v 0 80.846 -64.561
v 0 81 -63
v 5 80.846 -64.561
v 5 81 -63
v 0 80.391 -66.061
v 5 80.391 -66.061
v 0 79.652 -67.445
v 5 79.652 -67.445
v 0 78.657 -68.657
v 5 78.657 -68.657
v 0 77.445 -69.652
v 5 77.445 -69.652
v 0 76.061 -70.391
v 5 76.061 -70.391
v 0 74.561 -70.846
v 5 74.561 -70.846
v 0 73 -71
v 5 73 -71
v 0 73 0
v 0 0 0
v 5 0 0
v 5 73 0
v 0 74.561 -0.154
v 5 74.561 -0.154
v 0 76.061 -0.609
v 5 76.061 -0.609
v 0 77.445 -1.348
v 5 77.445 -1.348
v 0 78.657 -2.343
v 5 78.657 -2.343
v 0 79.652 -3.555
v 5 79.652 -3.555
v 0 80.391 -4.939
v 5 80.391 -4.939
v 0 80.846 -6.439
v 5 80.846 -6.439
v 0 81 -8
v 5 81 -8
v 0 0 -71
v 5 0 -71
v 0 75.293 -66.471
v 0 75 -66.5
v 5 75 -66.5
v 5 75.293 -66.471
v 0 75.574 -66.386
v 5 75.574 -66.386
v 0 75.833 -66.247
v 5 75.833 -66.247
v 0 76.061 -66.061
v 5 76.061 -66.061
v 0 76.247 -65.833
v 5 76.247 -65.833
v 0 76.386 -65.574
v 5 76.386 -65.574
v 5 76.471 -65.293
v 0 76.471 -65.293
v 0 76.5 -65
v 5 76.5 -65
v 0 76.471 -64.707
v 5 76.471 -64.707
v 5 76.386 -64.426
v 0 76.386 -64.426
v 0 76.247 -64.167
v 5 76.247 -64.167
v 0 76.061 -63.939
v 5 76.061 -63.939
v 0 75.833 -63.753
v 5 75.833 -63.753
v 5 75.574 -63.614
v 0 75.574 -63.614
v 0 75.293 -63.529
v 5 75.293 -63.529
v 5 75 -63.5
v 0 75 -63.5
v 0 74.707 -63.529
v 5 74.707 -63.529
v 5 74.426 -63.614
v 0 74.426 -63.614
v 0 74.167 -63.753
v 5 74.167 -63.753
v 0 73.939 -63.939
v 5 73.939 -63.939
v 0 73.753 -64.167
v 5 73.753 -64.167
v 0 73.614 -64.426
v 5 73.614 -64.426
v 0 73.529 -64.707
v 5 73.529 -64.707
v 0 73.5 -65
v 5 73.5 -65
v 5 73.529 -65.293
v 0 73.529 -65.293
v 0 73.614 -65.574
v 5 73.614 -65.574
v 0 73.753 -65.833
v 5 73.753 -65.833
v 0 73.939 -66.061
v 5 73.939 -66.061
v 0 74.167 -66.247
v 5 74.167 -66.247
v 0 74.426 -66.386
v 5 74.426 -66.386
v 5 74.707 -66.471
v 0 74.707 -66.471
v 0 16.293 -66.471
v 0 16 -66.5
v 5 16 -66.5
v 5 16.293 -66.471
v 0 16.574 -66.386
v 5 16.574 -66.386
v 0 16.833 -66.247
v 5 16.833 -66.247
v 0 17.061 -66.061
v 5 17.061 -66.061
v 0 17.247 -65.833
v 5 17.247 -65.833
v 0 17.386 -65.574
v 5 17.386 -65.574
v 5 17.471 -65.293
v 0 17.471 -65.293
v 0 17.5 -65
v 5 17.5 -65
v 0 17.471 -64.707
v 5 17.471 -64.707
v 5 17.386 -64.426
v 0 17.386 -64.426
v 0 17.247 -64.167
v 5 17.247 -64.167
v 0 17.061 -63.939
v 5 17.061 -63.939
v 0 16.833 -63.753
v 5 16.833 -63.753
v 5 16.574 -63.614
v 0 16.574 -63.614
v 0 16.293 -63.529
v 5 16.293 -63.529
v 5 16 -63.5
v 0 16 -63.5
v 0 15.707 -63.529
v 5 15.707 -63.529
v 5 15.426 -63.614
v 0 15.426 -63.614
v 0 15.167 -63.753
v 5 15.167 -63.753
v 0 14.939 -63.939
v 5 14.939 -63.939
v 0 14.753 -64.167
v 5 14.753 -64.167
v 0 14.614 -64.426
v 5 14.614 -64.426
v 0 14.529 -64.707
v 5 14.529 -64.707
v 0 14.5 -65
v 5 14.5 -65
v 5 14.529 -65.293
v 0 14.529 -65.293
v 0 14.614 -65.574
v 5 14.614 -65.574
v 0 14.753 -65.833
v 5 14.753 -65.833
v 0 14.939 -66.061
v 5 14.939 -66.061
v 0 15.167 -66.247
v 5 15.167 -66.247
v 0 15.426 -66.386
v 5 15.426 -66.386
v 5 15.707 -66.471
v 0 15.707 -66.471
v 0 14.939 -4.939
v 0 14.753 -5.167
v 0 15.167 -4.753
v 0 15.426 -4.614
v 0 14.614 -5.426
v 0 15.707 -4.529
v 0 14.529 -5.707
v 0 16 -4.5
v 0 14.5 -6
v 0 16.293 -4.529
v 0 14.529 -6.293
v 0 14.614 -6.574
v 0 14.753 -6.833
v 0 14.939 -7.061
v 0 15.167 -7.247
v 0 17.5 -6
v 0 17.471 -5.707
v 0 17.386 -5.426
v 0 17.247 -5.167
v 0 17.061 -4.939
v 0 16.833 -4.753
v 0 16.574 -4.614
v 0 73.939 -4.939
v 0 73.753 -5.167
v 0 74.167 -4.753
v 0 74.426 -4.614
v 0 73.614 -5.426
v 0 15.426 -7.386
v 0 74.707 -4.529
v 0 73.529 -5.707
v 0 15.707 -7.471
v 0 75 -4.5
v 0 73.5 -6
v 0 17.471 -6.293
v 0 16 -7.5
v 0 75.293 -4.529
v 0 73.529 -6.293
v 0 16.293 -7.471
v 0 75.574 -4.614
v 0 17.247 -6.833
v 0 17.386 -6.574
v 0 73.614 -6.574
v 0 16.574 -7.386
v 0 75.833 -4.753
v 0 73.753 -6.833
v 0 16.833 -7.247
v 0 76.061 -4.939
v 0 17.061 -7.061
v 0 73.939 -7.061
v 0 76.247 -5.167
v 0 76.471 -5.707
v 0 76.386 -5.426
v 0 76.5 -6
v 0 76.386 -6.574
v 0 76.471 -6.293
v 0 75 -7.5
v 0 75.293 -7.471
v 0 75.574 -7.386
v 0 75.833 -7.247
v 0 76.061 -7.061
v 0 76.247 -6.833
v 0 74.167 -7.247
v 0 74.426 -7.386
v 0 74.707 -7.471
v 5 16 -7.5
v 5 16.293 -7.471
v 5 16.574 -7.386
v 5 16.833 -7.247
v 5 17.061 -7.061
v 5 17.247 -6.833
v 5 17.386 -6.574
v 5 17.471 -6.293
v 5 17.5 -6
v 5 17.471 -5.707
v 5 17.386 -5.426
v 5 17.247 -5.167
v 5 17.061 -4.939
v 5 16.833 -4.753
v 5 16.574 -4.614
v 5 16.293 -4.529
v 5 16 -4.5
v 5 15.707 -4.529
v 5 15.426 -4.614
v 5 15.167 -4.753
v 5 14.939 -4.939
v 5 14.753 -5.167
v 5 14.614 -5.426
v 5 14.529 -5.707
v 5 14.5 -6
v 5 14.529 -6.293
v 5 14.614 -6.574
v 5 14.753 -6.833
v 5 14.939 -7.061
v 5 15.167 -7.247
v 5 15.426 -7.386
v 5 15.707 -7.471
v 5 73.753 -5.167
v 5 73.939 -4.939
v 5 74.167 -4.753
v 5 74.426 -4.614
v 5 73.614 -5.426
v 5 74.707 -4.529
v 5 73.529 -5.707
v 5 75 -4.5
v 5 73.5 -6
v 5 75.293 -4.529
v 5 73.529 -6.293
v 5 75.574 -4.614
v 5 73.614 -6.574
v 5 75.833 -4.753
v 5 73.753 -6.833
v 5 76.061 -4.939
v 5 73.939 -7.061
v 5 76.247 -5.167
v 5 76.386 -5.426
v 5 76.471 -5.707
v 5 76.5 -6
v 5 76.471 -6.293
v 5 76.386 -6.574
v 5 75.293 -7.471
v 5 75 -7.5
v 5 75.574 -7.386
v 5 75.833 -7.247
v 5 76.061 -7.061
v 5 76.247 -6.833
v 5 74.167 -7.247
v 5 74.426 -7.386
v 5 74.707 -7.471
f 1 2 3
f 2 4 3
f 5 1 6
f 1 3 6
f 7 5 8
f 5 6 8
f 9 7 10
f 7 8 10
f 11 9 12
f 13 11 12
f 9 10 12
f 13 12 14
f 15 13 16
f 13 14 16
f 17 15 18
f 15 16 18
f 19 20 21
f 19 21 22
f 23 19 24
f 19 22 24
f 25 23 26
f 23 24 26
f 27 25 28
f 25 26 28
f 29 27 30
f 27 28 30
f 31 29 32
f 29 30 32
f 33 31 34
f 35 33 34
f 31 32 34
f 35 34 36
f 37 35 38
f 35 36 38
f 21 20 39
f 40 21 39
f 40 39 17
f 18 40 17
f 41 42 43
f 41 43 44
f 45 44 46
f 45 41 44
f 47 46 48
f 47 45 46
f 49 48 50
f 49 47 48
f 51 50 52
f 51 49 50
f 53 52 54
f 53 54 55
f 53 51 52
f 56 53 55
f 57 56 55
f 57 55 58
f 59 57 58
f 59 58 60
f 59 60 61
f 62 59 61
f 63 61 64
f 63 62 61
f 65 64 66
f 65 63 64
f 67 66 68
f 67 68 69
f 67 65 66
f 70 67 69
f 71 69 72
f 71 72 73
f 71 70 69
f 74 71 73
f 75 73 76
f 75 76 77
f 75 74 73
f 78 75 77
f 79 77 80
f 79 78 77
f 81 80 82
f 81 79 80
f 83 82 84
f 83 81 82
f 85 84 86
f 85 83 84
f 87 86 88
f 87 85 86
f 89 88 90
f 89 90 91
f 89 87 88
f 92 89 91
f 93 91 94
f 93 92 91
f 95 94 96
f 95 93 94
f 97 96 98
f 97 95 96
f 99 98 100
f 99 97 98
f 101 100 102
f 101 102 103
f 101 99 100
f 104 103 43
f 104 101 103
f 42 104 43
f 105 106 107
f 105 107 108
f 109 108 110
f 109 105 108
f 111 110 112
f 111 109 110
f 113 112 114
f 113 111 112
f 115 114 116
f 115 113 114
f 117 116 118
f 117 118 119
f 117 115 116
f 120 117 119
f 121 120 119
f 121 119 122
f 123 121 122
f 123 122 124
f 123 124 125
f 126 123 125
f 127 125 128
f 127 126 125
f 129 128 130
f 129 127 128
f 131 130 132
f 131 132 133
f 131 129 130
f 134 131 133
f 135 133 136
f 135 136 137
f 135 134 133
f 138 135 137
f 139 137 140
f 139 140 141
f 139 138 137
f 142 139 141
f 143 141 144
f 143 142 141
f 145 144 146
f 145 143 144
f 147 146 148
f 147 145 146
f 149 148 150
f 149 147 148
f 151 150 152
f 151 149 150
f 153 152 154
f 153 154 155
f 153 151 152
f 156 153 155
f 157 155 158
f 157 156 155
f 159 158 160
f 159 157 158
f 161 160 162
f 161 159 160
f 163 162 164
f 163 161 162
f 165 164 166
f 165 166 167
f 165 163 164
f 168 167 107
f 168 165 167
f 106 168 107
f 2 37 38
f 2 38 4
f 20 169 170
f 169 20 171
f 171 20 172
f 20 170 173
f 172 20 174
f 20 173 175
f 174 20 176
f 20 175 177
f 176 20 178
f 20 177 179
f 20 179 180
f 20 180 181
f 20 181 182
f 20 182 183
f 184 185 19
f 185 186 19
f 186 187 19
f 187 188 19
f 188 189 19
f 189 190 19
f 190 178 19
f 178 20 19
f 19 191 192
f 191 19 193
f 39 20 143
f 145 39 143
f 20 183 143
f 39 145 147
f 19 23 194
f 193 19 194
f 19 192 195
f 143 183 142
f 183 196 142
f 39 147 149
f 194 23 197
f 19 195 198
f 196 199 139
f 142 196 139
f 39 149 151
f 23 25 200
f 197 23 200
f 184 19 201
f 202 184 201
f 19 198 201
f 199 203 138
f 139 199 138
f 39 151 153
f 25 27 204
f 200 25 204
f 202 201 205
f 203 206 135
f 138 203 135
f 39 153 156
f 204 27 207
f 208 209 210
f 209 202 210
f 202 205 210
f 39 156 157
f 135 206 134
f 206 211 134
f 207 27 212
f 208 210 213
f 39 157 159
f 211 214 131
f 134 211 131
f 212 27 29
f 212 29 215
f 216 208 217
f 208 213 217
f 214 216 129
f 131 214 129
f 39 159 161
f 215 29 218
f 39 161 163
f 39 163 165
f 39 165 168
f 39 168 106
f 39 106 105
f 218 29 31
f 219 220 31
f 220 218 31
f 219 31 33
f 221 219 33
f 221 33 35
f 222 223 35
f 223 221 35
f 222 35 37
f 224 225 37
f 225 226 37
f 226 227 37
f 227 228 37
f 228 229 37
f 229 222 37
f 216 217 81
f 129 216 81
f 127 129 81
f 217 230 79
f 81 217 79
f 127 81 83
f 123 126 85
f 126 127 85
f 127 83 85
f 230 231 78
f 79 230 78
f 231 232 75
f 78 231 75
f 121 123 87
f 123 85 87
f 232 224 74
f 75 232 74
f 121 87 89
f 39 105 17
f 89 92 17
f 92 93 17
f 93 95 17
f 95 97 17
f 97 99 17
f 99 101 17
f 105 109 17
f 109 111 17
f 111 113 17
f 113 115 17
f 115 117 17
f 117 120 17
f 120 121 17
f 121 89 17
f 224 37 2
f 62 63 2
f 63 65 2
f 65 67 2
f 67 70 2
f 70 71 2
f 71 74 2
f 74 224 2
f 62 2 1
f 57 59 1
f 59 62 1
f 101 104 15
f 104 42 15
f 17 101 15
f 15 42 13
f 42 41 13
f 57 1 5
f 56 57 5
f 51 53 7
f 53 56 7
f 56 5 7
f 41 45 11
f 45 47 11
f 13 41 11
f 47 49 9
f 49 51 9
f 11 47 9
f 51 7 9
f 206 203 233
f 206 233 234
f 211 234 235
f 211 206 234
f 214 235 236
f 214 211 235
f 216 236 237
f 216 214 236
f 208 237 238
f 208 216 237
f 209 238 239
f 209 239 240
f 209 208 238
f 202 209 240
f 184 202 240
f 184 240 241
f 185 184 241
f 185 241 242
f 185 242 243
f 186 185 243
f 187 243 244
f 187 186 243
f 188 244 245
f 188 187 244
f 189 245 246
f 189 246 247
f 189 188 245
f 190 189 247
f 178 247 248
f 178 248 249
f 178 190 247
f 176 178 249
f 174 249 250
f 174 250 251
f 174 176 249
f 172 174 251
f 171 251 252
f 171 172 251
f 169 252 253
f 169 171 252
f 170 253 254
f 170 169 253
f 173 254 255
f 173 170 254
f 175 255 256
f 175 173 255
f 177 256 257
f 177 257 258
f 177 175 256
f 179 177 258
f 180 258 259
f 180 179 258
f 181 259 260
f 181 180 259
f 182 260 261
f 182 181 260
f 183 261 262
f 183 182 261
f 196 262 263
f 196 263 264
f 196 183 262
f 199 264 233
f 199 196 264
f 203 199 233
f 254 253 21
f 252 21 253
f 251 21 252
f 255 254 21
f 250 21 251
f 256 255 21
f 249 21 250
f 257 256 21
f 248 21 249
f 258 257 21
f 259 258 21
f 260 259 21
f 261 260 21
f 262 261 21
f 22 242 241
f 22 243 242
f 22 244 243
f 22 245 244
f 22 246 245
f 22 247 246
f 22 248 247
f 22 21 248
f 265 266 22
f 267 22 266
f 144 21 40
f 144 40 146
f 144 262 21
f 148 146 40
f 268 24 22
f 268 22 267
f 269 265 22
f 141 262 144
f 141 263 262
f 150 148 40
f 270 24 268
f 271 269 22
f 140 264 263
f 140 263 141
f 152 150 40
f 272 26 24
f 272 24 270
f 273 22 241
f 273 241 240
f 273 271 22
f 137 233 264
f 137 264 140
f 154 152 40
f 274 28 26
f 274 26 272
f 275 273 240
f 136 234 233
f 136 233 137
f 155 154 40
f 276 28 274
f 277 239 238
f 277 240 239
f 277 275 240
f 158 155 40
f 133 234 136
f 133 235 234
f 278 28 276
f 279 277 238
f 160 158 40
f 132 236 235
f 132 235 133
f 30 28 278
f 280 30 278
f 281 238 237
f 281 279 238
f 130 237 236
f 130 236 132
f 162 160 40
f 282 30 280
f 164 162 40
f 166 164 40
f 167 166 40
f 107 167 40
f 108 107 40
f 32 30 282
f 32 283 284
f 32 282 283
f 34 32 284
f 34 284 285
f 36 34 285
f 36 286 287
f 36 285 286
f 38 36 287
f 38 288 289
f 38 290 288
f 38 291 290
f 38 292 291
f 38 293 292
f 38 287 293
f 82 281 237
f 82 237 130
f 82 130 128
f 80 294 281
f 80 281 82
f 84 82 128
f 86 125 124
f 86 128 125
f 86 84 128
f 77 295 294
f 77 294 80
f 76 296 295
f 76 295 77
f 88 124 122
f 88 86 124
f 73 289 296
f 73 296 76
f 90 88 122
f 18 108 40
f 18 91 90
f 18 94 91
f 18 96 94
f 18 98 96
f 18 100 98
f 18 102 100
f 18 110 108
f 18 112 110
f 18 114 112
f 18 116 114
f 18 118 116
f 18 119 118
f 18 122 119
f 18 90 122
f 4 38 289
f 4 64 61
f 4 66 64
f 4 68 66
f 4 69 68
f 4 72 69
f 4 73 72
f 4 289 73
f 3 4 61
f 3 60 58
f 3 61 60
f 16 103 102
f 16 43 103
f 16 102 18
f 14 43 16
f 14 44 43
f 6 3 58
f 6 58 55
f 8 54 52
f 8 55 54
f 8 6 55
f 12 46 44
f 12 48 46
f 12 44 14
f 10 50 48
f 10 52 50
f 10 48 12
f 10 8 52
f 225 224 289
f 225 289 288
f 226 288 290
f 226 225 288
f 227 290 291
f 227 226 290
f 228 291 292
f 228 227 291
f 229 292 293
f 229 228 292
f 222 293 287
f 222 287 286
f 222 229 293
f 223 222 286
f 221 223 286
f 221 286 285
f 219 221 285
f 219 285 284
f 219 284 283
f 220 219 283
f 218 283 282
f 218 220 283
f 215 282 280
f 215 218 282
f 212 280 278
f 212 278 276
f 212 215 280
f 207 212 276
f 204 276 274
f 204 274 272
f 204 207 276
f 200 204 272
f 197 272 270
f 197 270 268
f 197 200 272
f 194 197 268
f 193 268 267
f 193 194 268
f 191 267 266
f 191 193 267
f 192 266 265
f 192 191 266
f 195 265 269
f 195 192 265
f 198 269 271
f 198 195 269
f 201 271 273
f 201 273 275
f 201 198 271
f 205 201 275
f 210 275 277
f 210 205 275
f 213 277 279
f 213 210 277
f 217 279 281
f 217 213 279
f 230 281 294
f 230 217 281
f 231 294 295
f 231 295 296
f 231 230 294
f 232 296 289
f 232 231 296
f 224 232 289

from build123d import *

# Parameters (mm, degrees)
SKETCH1_W           = 71
SKETCH1_H           = 81
SKETCH1_R           = 1.5
BOSS_EXTRUDE1_DEPTH = 5
FILLET1_R           = 8


with BuildPart() as part:
    # Sketch1 → Boss-Extrude1 (new body)
    with BuildSketch(Plane(origin=(0, 0, 0), x_dir=(0, 0, -1), z_dir=(1, 0, 0))):
        with Locations((35.5, 40.5)):
            Rectangle(SKETCH1_W, SKETCH1_H)
        with Locations((6, 75)):
            Circle(SKETCH1_R, mode=Mode.SUBTRACT)
        with Locations((65, 75)):
            Circle(SKETCH1_R, mode=Mode.SUBTRACT)
        with Locations((6, 16)):
            Circle(SKETCH1_R, mode=Mode.SUBTRACT)
        with Locations((65, 16)):
            Circle(SKETCH1_R, mode=Mode.SUBTRACT)
    extrude(amount=BOSS_EXTRUDE1_DEPTH)

    # Fillet1
    fillet1_edges = [part.edges().sort_by_distance(p)[0] for p in [
        (2.5, 81, 0),
        (2.5, 81, -71),
    ]]
    fillet(fillet1_edges, radius=FILLET1_R)


solid = part.part
